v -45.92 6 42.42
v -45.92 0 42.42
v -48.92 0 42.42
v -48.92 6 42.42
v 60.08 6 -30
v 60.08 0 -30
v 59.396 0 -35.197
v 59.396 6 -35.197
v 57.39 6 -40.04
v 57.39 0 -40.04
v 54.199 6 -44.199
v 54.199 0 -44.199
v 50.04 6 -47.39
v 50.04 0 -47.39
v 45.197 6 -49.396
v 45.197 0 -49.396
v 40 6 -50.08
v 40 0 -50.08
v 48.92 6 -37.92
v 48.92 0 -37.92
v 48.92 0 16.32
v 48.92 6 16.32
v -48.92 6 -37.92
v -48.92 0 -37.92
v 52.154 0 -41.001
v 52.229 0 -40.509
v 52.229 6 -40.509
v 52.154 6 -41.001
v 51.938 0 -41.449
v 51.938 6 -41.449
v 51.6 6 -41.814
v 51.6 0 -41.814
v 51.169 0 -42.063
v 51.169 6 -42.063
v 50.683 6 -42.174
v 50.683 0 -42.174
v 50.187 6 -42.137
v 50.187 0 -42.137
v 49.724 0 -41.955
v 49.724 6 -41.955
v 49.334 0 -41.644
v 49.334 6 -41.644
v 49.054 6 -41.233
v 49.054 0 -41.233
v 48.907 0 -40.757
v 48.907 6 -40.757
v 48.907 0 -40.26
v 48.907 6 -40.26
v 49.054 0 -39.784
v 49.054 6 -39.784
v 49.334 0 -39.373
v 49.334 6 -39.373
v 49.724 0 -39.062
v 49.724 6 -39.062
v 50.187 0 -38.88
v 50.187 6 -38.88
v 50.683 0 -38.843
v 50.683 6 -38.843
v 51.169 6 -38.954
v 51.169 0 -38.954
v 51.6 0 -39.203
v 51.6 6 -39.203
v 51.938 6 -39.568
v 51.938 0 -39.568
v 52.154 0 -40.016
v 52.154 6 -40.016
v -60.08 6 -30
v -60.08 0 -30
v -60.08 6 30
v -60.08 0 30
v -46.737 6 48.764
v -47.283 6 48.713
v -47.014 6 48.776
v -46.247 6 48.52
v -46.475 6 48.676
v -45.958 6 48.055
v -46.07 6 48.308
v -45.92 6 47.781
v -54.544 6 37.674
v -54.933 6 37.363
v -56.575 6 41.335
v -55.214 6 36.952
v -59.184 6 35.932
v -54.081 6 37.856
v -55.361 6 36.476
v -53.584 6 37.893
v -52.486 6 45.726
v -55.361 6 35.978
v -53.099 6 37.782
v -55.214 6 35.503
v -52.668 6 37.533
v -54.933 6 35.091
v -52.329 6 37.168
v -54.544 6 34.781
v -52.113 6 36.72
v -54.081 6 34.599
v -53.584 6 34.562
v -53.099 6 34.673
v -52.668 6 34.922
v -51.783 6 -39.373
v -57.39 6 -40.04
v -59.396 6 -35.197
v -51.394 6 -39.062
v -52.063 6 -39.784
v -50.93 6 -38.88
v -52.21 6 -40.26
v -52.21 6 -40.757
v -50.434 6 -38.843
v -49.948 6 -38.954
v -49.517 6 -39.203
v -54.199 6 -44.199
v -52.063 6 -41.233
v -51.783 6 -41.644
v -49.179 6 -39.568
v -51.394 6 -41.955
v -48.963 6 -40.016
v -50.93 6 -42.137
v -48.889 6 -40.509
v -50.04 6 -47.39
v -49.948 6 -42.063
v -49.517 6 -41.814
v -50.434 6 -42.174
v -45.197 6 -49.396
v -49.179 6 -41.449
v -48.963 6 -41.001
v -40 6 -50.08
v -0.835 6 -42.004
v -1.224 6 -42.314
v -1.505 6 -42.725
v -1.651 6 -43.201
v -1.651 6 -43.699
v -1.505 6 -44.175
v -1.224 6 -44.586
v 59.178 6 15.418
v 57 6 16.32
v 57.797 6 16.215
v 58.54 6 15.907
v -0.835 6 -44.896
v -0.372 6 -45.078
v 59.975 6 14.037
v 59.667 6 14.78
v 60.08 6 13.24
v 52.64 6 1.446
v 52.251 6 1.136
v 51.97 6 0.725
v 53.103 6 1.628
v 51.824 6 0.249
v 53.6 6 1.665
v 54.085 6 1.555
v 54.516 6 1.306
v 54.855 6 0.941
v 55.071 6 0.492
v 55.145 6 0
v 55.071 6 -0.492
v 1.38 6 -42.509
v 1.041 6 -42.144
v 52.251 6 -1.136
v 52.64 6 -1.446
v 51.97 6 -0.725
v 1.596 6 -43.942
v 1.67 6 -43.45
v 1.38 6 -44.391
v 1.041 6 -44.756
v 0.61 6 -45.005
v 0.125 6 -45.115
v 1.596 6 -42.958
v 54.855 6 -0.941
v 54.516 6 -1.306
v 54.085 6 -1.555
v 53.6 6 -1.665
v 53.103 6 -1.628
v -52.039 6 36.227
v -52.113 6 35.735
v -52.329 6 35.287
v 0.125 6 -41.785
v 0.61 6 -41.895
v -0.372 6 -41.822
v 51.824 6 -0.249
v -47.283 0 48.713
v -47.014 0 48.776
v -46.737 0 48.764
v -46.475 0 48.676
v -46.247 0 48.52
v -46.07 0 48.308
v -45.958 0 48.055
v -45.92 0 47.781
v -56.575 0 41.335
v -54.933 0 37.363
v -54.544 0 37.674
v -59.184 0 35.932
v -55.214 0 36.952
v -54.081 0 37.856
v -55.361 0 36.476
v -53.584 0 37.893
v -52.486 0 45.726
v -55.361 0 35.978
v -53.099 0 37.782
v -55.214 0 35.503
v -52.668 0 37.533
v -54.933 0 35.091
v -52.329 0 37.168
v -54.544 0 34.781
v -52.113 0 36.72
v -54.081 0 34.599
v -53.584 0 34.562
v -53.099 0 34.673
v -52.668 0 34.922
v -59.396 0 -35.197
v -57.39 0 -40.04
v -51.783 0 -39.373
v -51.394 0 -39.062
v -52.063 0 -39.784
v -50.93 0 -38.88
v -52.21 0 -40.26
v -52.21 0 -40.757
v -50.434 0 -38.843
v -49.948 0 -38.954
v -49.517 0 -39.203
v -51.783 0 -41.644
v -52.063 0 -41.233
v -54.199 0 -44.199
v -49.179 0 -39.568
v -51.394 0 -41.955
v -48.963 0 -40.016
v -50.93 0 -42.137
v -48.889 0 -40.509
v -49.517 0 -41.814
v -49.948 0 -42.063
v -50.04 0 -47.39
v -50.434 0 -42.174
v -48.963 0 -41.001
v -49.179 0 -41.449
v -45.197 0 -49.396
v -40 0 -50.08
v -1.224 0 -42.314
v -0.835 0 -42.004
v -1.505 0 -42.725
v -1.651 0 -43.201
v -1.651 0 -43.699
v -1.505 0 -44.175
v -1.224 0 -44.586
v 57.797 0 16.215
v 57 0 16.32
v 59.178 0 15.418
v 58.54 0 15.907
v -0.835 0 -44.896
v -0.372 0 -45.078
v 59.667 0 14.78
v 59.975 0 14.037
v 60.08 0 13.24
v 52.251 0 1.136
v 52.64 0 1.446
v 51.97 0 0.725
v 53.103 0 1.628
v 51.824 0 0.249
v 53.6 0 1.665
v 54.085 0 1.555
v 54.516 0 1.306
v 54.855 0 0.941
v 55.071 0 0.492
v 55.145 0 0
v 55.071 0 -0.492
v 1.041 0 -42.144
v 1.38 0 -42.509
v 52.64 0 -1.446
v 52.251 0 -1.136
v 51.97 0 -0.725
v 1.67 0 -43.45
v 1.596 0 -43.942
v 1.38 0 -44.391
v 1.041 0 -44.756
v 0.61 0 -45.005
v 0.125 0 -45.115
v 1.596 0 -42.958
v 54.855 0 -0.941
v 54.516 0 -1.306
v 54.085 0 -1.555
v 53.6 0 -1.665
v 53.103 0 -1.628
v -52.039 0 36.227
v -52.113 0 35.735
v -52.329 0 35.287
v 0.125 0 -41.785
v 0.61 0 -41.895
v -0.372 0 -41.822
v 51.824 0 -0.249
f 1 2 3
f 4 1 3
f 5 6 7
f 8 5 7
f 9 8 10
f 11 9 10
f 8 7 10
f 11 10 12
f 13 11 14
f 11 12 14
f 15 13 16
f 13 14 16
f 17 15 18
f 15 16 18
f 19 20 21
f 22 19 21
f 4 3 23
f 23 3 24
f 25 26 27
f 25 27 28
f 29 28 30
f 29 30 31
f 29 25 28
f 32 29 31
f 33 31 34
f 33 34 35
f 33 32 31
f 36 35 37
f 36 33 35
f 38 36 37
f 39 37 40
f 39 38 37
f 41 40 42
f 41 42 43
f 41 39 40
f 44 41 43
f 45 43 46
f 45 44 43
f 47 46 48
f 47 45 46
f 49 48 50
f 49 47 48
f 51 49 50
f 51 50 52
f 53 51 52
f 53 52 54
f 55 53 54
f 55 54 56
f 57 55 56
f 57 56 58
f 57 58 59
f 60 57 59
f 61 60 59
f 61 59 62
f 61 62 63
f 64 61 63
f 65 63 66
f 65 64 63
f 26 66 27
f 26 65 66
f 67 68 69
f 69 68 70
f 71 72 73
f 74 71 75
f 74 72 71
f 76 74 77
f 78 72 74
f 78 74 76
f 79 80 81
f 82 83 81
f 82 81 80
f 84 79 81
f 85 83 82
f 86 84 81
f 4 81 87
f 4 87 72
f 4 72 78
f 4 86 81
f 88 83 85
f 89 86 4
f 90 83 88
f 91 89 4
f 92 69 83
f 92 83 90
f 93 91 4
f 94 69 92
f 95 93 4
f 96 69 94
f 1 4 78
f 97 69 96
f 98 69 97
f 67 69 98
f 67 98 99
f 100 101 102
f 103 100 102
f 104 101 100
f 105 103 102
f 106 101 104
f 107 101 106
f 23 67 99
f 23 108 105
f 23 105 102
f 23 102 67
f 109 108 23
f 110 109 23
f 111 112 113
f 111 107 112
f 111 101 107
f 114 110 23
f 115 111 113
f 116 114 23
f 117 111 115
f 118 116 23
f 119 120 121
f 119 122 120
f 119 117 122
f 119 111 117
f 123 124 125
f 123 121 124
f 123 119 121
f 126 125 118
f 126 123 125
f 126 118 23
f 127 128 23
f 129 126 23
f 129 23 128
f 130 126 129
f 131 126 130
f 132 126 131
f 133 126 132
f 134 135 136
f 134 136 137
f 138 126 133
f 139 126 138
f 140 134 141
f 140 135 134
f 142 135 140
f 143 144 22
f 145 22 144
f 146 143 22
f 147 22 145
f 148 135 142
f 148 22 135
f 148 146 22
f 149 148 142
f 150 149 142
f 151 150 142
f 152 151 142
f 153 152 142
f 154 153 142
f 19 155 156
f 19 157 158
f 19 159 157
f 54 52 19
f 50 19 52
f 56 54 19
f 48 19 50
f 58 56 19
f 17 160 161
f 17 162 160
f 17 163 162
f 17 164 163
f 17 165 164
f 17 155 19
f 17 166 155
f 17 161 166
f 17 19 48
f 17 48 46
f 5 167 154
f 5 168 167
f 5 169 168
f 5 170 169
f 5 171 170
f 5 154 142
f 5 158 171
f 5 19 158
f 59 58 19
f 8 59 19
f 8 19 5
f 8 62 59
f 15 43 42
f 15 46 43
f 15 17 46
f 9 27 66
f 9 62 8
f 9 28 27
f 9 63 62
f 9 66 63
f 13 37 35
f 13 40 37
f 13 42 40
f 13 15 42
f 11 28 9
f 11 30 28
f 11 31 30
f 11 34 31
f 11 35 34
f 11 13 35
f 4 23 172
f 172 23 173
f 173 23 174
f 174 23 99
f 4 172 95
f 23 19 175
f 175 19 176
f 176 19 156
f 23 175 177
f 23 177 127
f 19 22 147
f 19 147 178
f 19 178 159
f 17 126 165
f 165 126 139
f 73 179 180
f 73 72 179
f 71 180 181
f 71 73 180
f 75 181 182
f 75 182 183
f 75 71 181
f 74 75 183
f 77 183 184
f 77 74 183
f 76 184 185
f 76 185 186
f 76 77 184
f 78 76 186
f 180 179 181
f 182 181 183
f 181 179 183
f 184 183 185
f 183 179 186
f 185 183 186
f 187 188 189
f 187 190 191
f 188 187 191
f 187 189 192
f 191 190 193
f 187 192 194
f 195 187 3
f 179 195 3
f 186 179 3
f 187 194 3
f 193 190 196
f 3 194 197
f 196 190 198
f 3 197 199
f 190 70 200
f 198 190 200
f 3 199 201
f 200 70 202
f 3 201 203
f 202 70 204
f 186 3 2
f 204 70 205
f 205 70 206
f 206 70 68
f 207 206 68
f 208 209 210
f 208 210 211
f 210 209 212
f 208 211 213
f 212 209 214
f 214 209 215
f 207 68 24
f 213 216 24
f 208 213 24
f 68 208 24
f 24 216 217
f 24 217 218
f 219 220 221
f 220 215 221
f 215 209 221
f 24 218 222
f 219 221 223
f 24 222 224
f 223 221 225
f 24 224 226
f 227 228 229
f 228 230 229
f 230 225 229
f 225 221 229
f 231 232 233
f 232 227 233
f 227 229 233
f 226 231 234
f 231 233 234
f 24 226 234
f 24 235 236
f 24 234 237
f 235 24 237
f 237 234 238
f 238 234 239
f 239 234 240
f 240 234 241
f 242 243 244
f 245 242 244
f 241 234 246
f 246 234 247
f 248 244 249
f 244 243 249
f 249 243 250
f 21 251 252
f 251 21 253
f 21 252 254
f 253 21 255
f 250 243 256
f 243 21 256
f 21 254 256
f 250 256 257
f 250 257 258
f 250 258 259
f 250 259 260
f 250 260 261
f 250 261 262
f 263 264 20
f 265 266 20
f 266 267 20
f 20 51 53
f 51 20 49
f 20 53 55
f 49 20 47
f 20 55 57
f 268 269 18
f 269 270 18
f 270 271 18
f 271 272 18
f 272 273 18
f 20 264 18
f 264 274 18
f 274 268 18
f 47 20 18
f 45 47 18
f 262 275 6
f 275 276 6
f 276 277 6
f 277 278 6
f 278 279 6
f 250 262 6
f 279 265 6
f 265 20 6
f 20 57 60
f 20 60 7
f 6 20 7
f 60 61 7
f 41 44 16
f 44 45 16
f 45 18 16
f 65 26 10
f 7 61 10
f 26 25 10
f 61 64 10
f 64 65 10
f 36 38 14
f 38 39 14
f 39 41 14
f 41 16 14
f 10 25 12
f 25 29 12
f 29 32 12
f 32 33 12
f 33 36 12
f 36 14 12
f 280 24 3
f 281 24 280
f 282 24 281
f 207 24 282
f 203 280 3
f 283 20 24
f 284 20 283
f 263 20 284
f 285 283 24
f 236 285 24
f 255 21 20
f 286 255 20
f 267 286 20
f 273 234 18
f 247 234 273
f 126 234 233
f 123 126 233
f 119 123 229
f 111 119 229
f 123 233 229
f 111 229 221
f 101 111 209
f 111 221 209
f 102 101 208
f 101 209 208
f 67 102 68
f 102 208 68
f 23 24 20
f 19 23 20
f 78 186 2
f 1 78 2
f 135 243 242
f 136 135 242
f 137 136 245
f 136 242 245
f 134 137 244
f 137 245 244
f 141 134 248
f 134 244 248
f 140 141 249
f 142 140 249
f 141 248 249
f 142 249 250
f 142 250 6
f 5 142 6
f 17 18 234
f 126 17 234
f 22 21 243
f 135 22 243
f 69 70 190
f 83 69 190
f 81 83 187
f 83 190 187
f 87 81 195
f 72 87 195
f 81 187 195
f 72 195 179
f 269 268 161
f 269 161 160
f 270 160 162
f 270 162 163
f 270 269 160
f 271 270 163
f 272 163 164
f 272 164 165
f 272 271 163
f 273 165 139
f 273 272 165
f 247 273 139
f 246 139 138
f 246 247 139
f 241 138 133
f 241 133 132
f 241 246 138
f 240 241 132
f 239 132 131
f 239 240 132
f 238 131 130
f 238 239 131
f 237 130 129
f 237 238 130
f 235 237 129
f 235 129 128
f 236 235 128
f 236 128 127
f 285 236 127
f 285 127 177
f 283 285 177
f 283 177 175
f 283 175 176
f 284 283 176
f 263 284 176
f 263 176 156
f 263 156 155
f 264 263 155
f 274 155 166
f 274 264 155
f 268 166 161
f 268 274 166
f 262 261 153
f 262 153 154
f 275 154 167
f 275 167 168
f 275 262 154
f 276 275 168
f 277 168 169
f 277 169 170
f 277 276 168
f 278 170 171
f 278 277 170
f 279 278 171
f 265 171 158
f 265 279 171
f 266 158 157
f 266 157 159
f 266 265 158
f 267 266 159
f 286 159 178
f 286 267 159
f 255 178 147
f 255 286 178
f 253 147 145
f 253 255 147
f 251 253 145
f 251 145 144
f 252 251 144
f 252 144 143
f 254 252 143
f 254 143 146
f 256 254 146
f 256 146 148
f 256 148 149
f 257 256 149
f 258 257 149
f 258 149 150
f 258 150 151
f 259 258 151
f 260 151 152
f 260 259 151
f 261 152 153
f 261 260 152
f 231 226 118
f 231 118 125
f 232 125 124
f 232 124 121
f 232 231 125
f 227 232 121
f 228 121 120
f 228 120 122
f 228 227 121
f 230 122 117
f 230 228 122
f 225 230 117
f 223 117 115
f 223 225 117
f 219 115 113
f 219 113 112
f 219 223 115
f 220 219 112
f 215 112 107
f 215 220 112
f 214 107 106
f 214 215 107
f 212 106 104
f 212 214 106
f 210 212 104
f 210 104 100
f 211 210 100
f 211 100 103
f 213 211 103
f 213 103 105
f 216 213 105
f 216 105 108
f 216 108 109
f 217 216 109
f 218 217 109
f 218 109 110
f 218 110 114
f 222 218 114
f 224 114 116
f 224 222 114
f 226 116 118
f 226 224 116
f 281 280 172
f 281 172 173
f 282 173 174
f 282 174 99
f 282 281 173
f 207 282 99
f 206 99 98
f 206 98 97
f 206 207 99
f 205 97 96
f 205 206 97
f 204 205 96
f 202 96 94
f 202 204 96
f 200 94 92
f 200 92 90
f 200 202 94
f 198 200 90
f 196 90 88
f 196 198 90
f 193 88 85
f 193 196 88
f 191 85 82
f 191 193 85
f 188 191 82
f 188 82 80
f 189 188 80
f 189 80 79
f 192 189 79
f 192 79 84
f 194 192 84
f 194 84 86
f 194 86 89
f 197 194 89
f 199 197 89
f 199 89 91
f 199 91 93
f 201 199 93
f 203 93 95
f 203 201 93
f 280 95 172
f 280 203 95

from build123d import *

# Parameters (mm, degrees)
BOSS_EXTRUDE1_DEPTH    = 6
CUT_EXTRUDE1_DEPTH     = 79.33262411
SKETCH3_W              = 25
SKETCH3_H              = 31.620571099
CUT_EXTRUDE2_DEPTH     = 79.33262411
FILLET1_R              = 3
SKETCH4_R              = 1.75
CUT_EXTRUDE3_DEPTH     = 79.33262411
MOVE_FACE1_OUTLINE_R   = 1.75
MOVE_FACE1_OUTLINE_R_2 = 1.67
MOVE_FACE1_DEPTH       = 6
FILLET2_R              = 1


# Read off the part's stored shape, not the designer's step: Move Face1
with BuildPart() as part:
    # Sketch1 → Boss-Extrude1 (new body)
    with BuildSketch(Plane(origin=(0, 0, 0), x_dir=(1, 0, 0), z_dir=(0, 1, 0))):
        with BuildLine():
            Line((-60, 30), (-60, -30))
            ThreePointArc((-60, -30), (-54.142135624, -44.142135624), (-40, -50))
            Line((-40, -50), (40, -50))
            ThreePointArc((40, -50), (54.142135624, -44.142135624), (60, -30))
            Line((60, -30), (60, 30))
            ThreePointArc((60, 30), (54.142135624, 44.142135624), (40, 50))
            Line((40, 50), (-40, 50))
            ThreePointArc((-40, 50), (-54.142135624, 44.142135624), (-60, 30))
        make_face()
    extrude(amount=BOSS_EXTRUDE1_DEPTH)

    # Sketch2 → Cut-Extrude1 (cut, through all)
    with BuildSketch(Plane(origin=(0, 6, 0), x_dir=(1, 0, 0), z_dir=(0, 1, 0))):
        Polygon((-49, 38), (49, 38), (49, -50), (-46, -50), (-46, -42.5), (-49, -42.5), align=None)
    extrude(amount=-CUT_EXTRUDE1_DEPTH, mode=Mode.SUBTRACT)

    # Sketch3 → Cut-Extrude2 (cut, through all)
    with BuildSketch(Plane(origin=(0, 6, 0), x_dir=(1, 0, 0), z_dir=(0, 1, 0))):
        with Locations((61.5, -32.05028555)):
            Rectangle(SKETCH3_W, SKETCH3_H)
    extrude(amount=-CUT_EXTRUDE2_DEPTH, mode=Mode.SUBTRACT)

    # Fillet1
    fillet1_edges = [part.edges().sort_by_distance(p)[0] for p in [
        (60, 3, 16.24),
    ]]
    fillet(fillet1_edges, radius=FILLET1_R)

    # Sketch4 → Cut-Extrude3 (cut, through all)
    with BuildSketch(Plane(origin=(0, 6, 0), x_dir=(1, 0, 0), z_dir=(0, 1, 0))):
        with Locations(Location((53.475, 0, 0), (0, 0, 270))):
            Circle(SKETCH4_R)
        with Locations(Location((-53.709292606, -36.227375296, 0), (0, 0, 270))):
            Circle(SKETCH4_R)
        with Locations(Location((0, 43.45, 0), (0, 0, 270))):
            Circle(SKETCH4_R)
        with Locations(Location((50.558556763, 40.508556763, 0), (0, 0, 270))):
            Circle(SKETCH4_R)
        with Locations(Location((-50.558556763, 40.508556763, 0), (0, 0, 90))):
            Circle(SKETCH4_R)
    extrude(amount=-CUT_EXTRUDE3_DEPTH, mode=Mode.SUBTRACT)

    # Move Face1 outline → Move Face1 (add)
    # profile 1 of 6: a face of its own
    with BuildSketch(Plane(origin=(0, 0, 0), x_dir=(1, 0, 0), z_dir=(0, 1, 0))):
        with BuildLine():
            ThreePointArc((-40, 50.08), (-54.198704166, 44.198704166), (-60.08, 30))
            Line((-60.08, 30), (-60.08, -30))
            ThreePointArc((-60.08, -30), (-56.156732343, -41.923355232), (-45.92, -49.187495928))
            Line((-45.92, -49.187495928), (-45.92, -42.42))
            Line((-45.92, -42.42), (-48.92, -42.42))
            Line((-48.92, -42.42), (-48.92, 37.92))
            Line((-48.92, 37.92), (48.92, 37.92))
            Line((48.92, 37.92), (48.92, -16.32))
            Line((48.92, -16.32), (57, -16.32))
            ThreePointArc((57, -16.32), (59.177888886, -15.417888886), (60.08, -13.24))
            Line((60.08, -13.24), (60.08, 30))
            ThreePointArc((60.08, 30), (54.198704166, 44.198704166), (40, 50.08))
            Line((40, 50.08), (-40, 50.08))
        make_face()
        with BuildLine():
            Line((-60, -30), (-60, 30))
            ThreePointArc((-60, 30), (-54.142135624, 44.142135624), (-40, 50))
            Line((-40, 50), (40, 50))
            ThreePointArc((40, 50), (54.142135624, 44.142135624), (60, 30))
            Line((60, 30), (60, -13.24))
            ThreePointArc((60, -13.24), (59.121320344, -15.361320344), (57, -16.24))
            Line((57, -16.24), (49, -16.24))
            Line((49, -16.24), (49, 38))
            Line((49, 38), (-49, 38))
            Line((-49, 38), (-49, -42.5))
            Line((-49, -42.5), (-46, -42.5))
            Line((-46, -42.5), (-46, -49.078784028))
            ThreePointArc((-46, -49.078784028), (-56.124515497, -41.832159566), (-60, -30))
        make_face(mode=Mode.SUBTRACT)
    # profile 2 of 6: a face of its own
    with BuildSketch(Plane(origin=(0, 0, 0), x_dir=(1, 0, 0), z_dir=(0, 1, 0))):
        with Locations((53.475, 0)):
            Circle(MOVE_FACE1_OUTLINE_R)
        with Locations((53.475, 0)):
            Circle(MOVE_FACE1_OUTLINE_R_2, mode=Mode.SUBTRACT)
    # profile 3 of 6: a face of its own
    with BuildSketch(Plane(origin=(0, 0, 0), x_dir=(1, 0, 0), z_dir=(0, 1, 0))):
        with Locations((0, 43.45)):
            Circle(MOVE_FACE1_OUTLINE_R)
        with Locations((0, 43.45)):
            Circle(MOVE_FACE1_OUTLINE_R_2, mode=Mode.SUBTRACT)
    # profile 4 of 6: a face of its own
    with BuildSketch(Plane(origin=(0, 0, 0), x_dir=(1, 0, 0), z_dir=(0, 1, 0))):
        with Locations((50.558556763, 40.508556763)):
            Circle(MOVE_FACE1_OUTLINE_R)
        with Locations((50.558556763, 40.508556763)):
            Circle(MOVE_FACE1_OUTLINE_R_2, mode=Mode.SUBTRACT)
    # profile 5 of 6: a face of its own
    with BuildSketch(Plane(origin=(0, 0, 0), x_dir=(1, 0, 0), z_dir=(0, 1, 0))):
        with Locations((-50.558556763, 40.508556763)):
            Circle(MOVE_FACE1_OUTLINE_R)
        with Locations((-50.558556763, 40.508556763)):
            Circle(MOVE_FACE1_OUTLINE_R_2, mode=Mode.SUBTRACT)
    # profile 6 of 6: a face of its own
    with BuildSketch(Plane(origin=(0, 0, 0), x_dir=(1, 0, 0), z_dir=(0, 1, 0))):
        with Locations((-53.709292606, -36.227375296)):
            Circle(MOVE_FACE1_OUTLINE_R)
        with Locations((-53.709292606, -36.227375296)):
            Circle(MOVE_FACE1_OUTLINE_R_2, mode=Mode.SUBTRACT)
    extrude(amount=MOVE_FACE1_DEPTH)

    # Fillet2
    fillet2_edges = [part.edges().sort_by_distance(p)[0] for p in [
        (-45.92, 3, 49.187495928),
    ]]
    fillet(fillet2_edges, radius=FILLET2_R)


solid = part.part
